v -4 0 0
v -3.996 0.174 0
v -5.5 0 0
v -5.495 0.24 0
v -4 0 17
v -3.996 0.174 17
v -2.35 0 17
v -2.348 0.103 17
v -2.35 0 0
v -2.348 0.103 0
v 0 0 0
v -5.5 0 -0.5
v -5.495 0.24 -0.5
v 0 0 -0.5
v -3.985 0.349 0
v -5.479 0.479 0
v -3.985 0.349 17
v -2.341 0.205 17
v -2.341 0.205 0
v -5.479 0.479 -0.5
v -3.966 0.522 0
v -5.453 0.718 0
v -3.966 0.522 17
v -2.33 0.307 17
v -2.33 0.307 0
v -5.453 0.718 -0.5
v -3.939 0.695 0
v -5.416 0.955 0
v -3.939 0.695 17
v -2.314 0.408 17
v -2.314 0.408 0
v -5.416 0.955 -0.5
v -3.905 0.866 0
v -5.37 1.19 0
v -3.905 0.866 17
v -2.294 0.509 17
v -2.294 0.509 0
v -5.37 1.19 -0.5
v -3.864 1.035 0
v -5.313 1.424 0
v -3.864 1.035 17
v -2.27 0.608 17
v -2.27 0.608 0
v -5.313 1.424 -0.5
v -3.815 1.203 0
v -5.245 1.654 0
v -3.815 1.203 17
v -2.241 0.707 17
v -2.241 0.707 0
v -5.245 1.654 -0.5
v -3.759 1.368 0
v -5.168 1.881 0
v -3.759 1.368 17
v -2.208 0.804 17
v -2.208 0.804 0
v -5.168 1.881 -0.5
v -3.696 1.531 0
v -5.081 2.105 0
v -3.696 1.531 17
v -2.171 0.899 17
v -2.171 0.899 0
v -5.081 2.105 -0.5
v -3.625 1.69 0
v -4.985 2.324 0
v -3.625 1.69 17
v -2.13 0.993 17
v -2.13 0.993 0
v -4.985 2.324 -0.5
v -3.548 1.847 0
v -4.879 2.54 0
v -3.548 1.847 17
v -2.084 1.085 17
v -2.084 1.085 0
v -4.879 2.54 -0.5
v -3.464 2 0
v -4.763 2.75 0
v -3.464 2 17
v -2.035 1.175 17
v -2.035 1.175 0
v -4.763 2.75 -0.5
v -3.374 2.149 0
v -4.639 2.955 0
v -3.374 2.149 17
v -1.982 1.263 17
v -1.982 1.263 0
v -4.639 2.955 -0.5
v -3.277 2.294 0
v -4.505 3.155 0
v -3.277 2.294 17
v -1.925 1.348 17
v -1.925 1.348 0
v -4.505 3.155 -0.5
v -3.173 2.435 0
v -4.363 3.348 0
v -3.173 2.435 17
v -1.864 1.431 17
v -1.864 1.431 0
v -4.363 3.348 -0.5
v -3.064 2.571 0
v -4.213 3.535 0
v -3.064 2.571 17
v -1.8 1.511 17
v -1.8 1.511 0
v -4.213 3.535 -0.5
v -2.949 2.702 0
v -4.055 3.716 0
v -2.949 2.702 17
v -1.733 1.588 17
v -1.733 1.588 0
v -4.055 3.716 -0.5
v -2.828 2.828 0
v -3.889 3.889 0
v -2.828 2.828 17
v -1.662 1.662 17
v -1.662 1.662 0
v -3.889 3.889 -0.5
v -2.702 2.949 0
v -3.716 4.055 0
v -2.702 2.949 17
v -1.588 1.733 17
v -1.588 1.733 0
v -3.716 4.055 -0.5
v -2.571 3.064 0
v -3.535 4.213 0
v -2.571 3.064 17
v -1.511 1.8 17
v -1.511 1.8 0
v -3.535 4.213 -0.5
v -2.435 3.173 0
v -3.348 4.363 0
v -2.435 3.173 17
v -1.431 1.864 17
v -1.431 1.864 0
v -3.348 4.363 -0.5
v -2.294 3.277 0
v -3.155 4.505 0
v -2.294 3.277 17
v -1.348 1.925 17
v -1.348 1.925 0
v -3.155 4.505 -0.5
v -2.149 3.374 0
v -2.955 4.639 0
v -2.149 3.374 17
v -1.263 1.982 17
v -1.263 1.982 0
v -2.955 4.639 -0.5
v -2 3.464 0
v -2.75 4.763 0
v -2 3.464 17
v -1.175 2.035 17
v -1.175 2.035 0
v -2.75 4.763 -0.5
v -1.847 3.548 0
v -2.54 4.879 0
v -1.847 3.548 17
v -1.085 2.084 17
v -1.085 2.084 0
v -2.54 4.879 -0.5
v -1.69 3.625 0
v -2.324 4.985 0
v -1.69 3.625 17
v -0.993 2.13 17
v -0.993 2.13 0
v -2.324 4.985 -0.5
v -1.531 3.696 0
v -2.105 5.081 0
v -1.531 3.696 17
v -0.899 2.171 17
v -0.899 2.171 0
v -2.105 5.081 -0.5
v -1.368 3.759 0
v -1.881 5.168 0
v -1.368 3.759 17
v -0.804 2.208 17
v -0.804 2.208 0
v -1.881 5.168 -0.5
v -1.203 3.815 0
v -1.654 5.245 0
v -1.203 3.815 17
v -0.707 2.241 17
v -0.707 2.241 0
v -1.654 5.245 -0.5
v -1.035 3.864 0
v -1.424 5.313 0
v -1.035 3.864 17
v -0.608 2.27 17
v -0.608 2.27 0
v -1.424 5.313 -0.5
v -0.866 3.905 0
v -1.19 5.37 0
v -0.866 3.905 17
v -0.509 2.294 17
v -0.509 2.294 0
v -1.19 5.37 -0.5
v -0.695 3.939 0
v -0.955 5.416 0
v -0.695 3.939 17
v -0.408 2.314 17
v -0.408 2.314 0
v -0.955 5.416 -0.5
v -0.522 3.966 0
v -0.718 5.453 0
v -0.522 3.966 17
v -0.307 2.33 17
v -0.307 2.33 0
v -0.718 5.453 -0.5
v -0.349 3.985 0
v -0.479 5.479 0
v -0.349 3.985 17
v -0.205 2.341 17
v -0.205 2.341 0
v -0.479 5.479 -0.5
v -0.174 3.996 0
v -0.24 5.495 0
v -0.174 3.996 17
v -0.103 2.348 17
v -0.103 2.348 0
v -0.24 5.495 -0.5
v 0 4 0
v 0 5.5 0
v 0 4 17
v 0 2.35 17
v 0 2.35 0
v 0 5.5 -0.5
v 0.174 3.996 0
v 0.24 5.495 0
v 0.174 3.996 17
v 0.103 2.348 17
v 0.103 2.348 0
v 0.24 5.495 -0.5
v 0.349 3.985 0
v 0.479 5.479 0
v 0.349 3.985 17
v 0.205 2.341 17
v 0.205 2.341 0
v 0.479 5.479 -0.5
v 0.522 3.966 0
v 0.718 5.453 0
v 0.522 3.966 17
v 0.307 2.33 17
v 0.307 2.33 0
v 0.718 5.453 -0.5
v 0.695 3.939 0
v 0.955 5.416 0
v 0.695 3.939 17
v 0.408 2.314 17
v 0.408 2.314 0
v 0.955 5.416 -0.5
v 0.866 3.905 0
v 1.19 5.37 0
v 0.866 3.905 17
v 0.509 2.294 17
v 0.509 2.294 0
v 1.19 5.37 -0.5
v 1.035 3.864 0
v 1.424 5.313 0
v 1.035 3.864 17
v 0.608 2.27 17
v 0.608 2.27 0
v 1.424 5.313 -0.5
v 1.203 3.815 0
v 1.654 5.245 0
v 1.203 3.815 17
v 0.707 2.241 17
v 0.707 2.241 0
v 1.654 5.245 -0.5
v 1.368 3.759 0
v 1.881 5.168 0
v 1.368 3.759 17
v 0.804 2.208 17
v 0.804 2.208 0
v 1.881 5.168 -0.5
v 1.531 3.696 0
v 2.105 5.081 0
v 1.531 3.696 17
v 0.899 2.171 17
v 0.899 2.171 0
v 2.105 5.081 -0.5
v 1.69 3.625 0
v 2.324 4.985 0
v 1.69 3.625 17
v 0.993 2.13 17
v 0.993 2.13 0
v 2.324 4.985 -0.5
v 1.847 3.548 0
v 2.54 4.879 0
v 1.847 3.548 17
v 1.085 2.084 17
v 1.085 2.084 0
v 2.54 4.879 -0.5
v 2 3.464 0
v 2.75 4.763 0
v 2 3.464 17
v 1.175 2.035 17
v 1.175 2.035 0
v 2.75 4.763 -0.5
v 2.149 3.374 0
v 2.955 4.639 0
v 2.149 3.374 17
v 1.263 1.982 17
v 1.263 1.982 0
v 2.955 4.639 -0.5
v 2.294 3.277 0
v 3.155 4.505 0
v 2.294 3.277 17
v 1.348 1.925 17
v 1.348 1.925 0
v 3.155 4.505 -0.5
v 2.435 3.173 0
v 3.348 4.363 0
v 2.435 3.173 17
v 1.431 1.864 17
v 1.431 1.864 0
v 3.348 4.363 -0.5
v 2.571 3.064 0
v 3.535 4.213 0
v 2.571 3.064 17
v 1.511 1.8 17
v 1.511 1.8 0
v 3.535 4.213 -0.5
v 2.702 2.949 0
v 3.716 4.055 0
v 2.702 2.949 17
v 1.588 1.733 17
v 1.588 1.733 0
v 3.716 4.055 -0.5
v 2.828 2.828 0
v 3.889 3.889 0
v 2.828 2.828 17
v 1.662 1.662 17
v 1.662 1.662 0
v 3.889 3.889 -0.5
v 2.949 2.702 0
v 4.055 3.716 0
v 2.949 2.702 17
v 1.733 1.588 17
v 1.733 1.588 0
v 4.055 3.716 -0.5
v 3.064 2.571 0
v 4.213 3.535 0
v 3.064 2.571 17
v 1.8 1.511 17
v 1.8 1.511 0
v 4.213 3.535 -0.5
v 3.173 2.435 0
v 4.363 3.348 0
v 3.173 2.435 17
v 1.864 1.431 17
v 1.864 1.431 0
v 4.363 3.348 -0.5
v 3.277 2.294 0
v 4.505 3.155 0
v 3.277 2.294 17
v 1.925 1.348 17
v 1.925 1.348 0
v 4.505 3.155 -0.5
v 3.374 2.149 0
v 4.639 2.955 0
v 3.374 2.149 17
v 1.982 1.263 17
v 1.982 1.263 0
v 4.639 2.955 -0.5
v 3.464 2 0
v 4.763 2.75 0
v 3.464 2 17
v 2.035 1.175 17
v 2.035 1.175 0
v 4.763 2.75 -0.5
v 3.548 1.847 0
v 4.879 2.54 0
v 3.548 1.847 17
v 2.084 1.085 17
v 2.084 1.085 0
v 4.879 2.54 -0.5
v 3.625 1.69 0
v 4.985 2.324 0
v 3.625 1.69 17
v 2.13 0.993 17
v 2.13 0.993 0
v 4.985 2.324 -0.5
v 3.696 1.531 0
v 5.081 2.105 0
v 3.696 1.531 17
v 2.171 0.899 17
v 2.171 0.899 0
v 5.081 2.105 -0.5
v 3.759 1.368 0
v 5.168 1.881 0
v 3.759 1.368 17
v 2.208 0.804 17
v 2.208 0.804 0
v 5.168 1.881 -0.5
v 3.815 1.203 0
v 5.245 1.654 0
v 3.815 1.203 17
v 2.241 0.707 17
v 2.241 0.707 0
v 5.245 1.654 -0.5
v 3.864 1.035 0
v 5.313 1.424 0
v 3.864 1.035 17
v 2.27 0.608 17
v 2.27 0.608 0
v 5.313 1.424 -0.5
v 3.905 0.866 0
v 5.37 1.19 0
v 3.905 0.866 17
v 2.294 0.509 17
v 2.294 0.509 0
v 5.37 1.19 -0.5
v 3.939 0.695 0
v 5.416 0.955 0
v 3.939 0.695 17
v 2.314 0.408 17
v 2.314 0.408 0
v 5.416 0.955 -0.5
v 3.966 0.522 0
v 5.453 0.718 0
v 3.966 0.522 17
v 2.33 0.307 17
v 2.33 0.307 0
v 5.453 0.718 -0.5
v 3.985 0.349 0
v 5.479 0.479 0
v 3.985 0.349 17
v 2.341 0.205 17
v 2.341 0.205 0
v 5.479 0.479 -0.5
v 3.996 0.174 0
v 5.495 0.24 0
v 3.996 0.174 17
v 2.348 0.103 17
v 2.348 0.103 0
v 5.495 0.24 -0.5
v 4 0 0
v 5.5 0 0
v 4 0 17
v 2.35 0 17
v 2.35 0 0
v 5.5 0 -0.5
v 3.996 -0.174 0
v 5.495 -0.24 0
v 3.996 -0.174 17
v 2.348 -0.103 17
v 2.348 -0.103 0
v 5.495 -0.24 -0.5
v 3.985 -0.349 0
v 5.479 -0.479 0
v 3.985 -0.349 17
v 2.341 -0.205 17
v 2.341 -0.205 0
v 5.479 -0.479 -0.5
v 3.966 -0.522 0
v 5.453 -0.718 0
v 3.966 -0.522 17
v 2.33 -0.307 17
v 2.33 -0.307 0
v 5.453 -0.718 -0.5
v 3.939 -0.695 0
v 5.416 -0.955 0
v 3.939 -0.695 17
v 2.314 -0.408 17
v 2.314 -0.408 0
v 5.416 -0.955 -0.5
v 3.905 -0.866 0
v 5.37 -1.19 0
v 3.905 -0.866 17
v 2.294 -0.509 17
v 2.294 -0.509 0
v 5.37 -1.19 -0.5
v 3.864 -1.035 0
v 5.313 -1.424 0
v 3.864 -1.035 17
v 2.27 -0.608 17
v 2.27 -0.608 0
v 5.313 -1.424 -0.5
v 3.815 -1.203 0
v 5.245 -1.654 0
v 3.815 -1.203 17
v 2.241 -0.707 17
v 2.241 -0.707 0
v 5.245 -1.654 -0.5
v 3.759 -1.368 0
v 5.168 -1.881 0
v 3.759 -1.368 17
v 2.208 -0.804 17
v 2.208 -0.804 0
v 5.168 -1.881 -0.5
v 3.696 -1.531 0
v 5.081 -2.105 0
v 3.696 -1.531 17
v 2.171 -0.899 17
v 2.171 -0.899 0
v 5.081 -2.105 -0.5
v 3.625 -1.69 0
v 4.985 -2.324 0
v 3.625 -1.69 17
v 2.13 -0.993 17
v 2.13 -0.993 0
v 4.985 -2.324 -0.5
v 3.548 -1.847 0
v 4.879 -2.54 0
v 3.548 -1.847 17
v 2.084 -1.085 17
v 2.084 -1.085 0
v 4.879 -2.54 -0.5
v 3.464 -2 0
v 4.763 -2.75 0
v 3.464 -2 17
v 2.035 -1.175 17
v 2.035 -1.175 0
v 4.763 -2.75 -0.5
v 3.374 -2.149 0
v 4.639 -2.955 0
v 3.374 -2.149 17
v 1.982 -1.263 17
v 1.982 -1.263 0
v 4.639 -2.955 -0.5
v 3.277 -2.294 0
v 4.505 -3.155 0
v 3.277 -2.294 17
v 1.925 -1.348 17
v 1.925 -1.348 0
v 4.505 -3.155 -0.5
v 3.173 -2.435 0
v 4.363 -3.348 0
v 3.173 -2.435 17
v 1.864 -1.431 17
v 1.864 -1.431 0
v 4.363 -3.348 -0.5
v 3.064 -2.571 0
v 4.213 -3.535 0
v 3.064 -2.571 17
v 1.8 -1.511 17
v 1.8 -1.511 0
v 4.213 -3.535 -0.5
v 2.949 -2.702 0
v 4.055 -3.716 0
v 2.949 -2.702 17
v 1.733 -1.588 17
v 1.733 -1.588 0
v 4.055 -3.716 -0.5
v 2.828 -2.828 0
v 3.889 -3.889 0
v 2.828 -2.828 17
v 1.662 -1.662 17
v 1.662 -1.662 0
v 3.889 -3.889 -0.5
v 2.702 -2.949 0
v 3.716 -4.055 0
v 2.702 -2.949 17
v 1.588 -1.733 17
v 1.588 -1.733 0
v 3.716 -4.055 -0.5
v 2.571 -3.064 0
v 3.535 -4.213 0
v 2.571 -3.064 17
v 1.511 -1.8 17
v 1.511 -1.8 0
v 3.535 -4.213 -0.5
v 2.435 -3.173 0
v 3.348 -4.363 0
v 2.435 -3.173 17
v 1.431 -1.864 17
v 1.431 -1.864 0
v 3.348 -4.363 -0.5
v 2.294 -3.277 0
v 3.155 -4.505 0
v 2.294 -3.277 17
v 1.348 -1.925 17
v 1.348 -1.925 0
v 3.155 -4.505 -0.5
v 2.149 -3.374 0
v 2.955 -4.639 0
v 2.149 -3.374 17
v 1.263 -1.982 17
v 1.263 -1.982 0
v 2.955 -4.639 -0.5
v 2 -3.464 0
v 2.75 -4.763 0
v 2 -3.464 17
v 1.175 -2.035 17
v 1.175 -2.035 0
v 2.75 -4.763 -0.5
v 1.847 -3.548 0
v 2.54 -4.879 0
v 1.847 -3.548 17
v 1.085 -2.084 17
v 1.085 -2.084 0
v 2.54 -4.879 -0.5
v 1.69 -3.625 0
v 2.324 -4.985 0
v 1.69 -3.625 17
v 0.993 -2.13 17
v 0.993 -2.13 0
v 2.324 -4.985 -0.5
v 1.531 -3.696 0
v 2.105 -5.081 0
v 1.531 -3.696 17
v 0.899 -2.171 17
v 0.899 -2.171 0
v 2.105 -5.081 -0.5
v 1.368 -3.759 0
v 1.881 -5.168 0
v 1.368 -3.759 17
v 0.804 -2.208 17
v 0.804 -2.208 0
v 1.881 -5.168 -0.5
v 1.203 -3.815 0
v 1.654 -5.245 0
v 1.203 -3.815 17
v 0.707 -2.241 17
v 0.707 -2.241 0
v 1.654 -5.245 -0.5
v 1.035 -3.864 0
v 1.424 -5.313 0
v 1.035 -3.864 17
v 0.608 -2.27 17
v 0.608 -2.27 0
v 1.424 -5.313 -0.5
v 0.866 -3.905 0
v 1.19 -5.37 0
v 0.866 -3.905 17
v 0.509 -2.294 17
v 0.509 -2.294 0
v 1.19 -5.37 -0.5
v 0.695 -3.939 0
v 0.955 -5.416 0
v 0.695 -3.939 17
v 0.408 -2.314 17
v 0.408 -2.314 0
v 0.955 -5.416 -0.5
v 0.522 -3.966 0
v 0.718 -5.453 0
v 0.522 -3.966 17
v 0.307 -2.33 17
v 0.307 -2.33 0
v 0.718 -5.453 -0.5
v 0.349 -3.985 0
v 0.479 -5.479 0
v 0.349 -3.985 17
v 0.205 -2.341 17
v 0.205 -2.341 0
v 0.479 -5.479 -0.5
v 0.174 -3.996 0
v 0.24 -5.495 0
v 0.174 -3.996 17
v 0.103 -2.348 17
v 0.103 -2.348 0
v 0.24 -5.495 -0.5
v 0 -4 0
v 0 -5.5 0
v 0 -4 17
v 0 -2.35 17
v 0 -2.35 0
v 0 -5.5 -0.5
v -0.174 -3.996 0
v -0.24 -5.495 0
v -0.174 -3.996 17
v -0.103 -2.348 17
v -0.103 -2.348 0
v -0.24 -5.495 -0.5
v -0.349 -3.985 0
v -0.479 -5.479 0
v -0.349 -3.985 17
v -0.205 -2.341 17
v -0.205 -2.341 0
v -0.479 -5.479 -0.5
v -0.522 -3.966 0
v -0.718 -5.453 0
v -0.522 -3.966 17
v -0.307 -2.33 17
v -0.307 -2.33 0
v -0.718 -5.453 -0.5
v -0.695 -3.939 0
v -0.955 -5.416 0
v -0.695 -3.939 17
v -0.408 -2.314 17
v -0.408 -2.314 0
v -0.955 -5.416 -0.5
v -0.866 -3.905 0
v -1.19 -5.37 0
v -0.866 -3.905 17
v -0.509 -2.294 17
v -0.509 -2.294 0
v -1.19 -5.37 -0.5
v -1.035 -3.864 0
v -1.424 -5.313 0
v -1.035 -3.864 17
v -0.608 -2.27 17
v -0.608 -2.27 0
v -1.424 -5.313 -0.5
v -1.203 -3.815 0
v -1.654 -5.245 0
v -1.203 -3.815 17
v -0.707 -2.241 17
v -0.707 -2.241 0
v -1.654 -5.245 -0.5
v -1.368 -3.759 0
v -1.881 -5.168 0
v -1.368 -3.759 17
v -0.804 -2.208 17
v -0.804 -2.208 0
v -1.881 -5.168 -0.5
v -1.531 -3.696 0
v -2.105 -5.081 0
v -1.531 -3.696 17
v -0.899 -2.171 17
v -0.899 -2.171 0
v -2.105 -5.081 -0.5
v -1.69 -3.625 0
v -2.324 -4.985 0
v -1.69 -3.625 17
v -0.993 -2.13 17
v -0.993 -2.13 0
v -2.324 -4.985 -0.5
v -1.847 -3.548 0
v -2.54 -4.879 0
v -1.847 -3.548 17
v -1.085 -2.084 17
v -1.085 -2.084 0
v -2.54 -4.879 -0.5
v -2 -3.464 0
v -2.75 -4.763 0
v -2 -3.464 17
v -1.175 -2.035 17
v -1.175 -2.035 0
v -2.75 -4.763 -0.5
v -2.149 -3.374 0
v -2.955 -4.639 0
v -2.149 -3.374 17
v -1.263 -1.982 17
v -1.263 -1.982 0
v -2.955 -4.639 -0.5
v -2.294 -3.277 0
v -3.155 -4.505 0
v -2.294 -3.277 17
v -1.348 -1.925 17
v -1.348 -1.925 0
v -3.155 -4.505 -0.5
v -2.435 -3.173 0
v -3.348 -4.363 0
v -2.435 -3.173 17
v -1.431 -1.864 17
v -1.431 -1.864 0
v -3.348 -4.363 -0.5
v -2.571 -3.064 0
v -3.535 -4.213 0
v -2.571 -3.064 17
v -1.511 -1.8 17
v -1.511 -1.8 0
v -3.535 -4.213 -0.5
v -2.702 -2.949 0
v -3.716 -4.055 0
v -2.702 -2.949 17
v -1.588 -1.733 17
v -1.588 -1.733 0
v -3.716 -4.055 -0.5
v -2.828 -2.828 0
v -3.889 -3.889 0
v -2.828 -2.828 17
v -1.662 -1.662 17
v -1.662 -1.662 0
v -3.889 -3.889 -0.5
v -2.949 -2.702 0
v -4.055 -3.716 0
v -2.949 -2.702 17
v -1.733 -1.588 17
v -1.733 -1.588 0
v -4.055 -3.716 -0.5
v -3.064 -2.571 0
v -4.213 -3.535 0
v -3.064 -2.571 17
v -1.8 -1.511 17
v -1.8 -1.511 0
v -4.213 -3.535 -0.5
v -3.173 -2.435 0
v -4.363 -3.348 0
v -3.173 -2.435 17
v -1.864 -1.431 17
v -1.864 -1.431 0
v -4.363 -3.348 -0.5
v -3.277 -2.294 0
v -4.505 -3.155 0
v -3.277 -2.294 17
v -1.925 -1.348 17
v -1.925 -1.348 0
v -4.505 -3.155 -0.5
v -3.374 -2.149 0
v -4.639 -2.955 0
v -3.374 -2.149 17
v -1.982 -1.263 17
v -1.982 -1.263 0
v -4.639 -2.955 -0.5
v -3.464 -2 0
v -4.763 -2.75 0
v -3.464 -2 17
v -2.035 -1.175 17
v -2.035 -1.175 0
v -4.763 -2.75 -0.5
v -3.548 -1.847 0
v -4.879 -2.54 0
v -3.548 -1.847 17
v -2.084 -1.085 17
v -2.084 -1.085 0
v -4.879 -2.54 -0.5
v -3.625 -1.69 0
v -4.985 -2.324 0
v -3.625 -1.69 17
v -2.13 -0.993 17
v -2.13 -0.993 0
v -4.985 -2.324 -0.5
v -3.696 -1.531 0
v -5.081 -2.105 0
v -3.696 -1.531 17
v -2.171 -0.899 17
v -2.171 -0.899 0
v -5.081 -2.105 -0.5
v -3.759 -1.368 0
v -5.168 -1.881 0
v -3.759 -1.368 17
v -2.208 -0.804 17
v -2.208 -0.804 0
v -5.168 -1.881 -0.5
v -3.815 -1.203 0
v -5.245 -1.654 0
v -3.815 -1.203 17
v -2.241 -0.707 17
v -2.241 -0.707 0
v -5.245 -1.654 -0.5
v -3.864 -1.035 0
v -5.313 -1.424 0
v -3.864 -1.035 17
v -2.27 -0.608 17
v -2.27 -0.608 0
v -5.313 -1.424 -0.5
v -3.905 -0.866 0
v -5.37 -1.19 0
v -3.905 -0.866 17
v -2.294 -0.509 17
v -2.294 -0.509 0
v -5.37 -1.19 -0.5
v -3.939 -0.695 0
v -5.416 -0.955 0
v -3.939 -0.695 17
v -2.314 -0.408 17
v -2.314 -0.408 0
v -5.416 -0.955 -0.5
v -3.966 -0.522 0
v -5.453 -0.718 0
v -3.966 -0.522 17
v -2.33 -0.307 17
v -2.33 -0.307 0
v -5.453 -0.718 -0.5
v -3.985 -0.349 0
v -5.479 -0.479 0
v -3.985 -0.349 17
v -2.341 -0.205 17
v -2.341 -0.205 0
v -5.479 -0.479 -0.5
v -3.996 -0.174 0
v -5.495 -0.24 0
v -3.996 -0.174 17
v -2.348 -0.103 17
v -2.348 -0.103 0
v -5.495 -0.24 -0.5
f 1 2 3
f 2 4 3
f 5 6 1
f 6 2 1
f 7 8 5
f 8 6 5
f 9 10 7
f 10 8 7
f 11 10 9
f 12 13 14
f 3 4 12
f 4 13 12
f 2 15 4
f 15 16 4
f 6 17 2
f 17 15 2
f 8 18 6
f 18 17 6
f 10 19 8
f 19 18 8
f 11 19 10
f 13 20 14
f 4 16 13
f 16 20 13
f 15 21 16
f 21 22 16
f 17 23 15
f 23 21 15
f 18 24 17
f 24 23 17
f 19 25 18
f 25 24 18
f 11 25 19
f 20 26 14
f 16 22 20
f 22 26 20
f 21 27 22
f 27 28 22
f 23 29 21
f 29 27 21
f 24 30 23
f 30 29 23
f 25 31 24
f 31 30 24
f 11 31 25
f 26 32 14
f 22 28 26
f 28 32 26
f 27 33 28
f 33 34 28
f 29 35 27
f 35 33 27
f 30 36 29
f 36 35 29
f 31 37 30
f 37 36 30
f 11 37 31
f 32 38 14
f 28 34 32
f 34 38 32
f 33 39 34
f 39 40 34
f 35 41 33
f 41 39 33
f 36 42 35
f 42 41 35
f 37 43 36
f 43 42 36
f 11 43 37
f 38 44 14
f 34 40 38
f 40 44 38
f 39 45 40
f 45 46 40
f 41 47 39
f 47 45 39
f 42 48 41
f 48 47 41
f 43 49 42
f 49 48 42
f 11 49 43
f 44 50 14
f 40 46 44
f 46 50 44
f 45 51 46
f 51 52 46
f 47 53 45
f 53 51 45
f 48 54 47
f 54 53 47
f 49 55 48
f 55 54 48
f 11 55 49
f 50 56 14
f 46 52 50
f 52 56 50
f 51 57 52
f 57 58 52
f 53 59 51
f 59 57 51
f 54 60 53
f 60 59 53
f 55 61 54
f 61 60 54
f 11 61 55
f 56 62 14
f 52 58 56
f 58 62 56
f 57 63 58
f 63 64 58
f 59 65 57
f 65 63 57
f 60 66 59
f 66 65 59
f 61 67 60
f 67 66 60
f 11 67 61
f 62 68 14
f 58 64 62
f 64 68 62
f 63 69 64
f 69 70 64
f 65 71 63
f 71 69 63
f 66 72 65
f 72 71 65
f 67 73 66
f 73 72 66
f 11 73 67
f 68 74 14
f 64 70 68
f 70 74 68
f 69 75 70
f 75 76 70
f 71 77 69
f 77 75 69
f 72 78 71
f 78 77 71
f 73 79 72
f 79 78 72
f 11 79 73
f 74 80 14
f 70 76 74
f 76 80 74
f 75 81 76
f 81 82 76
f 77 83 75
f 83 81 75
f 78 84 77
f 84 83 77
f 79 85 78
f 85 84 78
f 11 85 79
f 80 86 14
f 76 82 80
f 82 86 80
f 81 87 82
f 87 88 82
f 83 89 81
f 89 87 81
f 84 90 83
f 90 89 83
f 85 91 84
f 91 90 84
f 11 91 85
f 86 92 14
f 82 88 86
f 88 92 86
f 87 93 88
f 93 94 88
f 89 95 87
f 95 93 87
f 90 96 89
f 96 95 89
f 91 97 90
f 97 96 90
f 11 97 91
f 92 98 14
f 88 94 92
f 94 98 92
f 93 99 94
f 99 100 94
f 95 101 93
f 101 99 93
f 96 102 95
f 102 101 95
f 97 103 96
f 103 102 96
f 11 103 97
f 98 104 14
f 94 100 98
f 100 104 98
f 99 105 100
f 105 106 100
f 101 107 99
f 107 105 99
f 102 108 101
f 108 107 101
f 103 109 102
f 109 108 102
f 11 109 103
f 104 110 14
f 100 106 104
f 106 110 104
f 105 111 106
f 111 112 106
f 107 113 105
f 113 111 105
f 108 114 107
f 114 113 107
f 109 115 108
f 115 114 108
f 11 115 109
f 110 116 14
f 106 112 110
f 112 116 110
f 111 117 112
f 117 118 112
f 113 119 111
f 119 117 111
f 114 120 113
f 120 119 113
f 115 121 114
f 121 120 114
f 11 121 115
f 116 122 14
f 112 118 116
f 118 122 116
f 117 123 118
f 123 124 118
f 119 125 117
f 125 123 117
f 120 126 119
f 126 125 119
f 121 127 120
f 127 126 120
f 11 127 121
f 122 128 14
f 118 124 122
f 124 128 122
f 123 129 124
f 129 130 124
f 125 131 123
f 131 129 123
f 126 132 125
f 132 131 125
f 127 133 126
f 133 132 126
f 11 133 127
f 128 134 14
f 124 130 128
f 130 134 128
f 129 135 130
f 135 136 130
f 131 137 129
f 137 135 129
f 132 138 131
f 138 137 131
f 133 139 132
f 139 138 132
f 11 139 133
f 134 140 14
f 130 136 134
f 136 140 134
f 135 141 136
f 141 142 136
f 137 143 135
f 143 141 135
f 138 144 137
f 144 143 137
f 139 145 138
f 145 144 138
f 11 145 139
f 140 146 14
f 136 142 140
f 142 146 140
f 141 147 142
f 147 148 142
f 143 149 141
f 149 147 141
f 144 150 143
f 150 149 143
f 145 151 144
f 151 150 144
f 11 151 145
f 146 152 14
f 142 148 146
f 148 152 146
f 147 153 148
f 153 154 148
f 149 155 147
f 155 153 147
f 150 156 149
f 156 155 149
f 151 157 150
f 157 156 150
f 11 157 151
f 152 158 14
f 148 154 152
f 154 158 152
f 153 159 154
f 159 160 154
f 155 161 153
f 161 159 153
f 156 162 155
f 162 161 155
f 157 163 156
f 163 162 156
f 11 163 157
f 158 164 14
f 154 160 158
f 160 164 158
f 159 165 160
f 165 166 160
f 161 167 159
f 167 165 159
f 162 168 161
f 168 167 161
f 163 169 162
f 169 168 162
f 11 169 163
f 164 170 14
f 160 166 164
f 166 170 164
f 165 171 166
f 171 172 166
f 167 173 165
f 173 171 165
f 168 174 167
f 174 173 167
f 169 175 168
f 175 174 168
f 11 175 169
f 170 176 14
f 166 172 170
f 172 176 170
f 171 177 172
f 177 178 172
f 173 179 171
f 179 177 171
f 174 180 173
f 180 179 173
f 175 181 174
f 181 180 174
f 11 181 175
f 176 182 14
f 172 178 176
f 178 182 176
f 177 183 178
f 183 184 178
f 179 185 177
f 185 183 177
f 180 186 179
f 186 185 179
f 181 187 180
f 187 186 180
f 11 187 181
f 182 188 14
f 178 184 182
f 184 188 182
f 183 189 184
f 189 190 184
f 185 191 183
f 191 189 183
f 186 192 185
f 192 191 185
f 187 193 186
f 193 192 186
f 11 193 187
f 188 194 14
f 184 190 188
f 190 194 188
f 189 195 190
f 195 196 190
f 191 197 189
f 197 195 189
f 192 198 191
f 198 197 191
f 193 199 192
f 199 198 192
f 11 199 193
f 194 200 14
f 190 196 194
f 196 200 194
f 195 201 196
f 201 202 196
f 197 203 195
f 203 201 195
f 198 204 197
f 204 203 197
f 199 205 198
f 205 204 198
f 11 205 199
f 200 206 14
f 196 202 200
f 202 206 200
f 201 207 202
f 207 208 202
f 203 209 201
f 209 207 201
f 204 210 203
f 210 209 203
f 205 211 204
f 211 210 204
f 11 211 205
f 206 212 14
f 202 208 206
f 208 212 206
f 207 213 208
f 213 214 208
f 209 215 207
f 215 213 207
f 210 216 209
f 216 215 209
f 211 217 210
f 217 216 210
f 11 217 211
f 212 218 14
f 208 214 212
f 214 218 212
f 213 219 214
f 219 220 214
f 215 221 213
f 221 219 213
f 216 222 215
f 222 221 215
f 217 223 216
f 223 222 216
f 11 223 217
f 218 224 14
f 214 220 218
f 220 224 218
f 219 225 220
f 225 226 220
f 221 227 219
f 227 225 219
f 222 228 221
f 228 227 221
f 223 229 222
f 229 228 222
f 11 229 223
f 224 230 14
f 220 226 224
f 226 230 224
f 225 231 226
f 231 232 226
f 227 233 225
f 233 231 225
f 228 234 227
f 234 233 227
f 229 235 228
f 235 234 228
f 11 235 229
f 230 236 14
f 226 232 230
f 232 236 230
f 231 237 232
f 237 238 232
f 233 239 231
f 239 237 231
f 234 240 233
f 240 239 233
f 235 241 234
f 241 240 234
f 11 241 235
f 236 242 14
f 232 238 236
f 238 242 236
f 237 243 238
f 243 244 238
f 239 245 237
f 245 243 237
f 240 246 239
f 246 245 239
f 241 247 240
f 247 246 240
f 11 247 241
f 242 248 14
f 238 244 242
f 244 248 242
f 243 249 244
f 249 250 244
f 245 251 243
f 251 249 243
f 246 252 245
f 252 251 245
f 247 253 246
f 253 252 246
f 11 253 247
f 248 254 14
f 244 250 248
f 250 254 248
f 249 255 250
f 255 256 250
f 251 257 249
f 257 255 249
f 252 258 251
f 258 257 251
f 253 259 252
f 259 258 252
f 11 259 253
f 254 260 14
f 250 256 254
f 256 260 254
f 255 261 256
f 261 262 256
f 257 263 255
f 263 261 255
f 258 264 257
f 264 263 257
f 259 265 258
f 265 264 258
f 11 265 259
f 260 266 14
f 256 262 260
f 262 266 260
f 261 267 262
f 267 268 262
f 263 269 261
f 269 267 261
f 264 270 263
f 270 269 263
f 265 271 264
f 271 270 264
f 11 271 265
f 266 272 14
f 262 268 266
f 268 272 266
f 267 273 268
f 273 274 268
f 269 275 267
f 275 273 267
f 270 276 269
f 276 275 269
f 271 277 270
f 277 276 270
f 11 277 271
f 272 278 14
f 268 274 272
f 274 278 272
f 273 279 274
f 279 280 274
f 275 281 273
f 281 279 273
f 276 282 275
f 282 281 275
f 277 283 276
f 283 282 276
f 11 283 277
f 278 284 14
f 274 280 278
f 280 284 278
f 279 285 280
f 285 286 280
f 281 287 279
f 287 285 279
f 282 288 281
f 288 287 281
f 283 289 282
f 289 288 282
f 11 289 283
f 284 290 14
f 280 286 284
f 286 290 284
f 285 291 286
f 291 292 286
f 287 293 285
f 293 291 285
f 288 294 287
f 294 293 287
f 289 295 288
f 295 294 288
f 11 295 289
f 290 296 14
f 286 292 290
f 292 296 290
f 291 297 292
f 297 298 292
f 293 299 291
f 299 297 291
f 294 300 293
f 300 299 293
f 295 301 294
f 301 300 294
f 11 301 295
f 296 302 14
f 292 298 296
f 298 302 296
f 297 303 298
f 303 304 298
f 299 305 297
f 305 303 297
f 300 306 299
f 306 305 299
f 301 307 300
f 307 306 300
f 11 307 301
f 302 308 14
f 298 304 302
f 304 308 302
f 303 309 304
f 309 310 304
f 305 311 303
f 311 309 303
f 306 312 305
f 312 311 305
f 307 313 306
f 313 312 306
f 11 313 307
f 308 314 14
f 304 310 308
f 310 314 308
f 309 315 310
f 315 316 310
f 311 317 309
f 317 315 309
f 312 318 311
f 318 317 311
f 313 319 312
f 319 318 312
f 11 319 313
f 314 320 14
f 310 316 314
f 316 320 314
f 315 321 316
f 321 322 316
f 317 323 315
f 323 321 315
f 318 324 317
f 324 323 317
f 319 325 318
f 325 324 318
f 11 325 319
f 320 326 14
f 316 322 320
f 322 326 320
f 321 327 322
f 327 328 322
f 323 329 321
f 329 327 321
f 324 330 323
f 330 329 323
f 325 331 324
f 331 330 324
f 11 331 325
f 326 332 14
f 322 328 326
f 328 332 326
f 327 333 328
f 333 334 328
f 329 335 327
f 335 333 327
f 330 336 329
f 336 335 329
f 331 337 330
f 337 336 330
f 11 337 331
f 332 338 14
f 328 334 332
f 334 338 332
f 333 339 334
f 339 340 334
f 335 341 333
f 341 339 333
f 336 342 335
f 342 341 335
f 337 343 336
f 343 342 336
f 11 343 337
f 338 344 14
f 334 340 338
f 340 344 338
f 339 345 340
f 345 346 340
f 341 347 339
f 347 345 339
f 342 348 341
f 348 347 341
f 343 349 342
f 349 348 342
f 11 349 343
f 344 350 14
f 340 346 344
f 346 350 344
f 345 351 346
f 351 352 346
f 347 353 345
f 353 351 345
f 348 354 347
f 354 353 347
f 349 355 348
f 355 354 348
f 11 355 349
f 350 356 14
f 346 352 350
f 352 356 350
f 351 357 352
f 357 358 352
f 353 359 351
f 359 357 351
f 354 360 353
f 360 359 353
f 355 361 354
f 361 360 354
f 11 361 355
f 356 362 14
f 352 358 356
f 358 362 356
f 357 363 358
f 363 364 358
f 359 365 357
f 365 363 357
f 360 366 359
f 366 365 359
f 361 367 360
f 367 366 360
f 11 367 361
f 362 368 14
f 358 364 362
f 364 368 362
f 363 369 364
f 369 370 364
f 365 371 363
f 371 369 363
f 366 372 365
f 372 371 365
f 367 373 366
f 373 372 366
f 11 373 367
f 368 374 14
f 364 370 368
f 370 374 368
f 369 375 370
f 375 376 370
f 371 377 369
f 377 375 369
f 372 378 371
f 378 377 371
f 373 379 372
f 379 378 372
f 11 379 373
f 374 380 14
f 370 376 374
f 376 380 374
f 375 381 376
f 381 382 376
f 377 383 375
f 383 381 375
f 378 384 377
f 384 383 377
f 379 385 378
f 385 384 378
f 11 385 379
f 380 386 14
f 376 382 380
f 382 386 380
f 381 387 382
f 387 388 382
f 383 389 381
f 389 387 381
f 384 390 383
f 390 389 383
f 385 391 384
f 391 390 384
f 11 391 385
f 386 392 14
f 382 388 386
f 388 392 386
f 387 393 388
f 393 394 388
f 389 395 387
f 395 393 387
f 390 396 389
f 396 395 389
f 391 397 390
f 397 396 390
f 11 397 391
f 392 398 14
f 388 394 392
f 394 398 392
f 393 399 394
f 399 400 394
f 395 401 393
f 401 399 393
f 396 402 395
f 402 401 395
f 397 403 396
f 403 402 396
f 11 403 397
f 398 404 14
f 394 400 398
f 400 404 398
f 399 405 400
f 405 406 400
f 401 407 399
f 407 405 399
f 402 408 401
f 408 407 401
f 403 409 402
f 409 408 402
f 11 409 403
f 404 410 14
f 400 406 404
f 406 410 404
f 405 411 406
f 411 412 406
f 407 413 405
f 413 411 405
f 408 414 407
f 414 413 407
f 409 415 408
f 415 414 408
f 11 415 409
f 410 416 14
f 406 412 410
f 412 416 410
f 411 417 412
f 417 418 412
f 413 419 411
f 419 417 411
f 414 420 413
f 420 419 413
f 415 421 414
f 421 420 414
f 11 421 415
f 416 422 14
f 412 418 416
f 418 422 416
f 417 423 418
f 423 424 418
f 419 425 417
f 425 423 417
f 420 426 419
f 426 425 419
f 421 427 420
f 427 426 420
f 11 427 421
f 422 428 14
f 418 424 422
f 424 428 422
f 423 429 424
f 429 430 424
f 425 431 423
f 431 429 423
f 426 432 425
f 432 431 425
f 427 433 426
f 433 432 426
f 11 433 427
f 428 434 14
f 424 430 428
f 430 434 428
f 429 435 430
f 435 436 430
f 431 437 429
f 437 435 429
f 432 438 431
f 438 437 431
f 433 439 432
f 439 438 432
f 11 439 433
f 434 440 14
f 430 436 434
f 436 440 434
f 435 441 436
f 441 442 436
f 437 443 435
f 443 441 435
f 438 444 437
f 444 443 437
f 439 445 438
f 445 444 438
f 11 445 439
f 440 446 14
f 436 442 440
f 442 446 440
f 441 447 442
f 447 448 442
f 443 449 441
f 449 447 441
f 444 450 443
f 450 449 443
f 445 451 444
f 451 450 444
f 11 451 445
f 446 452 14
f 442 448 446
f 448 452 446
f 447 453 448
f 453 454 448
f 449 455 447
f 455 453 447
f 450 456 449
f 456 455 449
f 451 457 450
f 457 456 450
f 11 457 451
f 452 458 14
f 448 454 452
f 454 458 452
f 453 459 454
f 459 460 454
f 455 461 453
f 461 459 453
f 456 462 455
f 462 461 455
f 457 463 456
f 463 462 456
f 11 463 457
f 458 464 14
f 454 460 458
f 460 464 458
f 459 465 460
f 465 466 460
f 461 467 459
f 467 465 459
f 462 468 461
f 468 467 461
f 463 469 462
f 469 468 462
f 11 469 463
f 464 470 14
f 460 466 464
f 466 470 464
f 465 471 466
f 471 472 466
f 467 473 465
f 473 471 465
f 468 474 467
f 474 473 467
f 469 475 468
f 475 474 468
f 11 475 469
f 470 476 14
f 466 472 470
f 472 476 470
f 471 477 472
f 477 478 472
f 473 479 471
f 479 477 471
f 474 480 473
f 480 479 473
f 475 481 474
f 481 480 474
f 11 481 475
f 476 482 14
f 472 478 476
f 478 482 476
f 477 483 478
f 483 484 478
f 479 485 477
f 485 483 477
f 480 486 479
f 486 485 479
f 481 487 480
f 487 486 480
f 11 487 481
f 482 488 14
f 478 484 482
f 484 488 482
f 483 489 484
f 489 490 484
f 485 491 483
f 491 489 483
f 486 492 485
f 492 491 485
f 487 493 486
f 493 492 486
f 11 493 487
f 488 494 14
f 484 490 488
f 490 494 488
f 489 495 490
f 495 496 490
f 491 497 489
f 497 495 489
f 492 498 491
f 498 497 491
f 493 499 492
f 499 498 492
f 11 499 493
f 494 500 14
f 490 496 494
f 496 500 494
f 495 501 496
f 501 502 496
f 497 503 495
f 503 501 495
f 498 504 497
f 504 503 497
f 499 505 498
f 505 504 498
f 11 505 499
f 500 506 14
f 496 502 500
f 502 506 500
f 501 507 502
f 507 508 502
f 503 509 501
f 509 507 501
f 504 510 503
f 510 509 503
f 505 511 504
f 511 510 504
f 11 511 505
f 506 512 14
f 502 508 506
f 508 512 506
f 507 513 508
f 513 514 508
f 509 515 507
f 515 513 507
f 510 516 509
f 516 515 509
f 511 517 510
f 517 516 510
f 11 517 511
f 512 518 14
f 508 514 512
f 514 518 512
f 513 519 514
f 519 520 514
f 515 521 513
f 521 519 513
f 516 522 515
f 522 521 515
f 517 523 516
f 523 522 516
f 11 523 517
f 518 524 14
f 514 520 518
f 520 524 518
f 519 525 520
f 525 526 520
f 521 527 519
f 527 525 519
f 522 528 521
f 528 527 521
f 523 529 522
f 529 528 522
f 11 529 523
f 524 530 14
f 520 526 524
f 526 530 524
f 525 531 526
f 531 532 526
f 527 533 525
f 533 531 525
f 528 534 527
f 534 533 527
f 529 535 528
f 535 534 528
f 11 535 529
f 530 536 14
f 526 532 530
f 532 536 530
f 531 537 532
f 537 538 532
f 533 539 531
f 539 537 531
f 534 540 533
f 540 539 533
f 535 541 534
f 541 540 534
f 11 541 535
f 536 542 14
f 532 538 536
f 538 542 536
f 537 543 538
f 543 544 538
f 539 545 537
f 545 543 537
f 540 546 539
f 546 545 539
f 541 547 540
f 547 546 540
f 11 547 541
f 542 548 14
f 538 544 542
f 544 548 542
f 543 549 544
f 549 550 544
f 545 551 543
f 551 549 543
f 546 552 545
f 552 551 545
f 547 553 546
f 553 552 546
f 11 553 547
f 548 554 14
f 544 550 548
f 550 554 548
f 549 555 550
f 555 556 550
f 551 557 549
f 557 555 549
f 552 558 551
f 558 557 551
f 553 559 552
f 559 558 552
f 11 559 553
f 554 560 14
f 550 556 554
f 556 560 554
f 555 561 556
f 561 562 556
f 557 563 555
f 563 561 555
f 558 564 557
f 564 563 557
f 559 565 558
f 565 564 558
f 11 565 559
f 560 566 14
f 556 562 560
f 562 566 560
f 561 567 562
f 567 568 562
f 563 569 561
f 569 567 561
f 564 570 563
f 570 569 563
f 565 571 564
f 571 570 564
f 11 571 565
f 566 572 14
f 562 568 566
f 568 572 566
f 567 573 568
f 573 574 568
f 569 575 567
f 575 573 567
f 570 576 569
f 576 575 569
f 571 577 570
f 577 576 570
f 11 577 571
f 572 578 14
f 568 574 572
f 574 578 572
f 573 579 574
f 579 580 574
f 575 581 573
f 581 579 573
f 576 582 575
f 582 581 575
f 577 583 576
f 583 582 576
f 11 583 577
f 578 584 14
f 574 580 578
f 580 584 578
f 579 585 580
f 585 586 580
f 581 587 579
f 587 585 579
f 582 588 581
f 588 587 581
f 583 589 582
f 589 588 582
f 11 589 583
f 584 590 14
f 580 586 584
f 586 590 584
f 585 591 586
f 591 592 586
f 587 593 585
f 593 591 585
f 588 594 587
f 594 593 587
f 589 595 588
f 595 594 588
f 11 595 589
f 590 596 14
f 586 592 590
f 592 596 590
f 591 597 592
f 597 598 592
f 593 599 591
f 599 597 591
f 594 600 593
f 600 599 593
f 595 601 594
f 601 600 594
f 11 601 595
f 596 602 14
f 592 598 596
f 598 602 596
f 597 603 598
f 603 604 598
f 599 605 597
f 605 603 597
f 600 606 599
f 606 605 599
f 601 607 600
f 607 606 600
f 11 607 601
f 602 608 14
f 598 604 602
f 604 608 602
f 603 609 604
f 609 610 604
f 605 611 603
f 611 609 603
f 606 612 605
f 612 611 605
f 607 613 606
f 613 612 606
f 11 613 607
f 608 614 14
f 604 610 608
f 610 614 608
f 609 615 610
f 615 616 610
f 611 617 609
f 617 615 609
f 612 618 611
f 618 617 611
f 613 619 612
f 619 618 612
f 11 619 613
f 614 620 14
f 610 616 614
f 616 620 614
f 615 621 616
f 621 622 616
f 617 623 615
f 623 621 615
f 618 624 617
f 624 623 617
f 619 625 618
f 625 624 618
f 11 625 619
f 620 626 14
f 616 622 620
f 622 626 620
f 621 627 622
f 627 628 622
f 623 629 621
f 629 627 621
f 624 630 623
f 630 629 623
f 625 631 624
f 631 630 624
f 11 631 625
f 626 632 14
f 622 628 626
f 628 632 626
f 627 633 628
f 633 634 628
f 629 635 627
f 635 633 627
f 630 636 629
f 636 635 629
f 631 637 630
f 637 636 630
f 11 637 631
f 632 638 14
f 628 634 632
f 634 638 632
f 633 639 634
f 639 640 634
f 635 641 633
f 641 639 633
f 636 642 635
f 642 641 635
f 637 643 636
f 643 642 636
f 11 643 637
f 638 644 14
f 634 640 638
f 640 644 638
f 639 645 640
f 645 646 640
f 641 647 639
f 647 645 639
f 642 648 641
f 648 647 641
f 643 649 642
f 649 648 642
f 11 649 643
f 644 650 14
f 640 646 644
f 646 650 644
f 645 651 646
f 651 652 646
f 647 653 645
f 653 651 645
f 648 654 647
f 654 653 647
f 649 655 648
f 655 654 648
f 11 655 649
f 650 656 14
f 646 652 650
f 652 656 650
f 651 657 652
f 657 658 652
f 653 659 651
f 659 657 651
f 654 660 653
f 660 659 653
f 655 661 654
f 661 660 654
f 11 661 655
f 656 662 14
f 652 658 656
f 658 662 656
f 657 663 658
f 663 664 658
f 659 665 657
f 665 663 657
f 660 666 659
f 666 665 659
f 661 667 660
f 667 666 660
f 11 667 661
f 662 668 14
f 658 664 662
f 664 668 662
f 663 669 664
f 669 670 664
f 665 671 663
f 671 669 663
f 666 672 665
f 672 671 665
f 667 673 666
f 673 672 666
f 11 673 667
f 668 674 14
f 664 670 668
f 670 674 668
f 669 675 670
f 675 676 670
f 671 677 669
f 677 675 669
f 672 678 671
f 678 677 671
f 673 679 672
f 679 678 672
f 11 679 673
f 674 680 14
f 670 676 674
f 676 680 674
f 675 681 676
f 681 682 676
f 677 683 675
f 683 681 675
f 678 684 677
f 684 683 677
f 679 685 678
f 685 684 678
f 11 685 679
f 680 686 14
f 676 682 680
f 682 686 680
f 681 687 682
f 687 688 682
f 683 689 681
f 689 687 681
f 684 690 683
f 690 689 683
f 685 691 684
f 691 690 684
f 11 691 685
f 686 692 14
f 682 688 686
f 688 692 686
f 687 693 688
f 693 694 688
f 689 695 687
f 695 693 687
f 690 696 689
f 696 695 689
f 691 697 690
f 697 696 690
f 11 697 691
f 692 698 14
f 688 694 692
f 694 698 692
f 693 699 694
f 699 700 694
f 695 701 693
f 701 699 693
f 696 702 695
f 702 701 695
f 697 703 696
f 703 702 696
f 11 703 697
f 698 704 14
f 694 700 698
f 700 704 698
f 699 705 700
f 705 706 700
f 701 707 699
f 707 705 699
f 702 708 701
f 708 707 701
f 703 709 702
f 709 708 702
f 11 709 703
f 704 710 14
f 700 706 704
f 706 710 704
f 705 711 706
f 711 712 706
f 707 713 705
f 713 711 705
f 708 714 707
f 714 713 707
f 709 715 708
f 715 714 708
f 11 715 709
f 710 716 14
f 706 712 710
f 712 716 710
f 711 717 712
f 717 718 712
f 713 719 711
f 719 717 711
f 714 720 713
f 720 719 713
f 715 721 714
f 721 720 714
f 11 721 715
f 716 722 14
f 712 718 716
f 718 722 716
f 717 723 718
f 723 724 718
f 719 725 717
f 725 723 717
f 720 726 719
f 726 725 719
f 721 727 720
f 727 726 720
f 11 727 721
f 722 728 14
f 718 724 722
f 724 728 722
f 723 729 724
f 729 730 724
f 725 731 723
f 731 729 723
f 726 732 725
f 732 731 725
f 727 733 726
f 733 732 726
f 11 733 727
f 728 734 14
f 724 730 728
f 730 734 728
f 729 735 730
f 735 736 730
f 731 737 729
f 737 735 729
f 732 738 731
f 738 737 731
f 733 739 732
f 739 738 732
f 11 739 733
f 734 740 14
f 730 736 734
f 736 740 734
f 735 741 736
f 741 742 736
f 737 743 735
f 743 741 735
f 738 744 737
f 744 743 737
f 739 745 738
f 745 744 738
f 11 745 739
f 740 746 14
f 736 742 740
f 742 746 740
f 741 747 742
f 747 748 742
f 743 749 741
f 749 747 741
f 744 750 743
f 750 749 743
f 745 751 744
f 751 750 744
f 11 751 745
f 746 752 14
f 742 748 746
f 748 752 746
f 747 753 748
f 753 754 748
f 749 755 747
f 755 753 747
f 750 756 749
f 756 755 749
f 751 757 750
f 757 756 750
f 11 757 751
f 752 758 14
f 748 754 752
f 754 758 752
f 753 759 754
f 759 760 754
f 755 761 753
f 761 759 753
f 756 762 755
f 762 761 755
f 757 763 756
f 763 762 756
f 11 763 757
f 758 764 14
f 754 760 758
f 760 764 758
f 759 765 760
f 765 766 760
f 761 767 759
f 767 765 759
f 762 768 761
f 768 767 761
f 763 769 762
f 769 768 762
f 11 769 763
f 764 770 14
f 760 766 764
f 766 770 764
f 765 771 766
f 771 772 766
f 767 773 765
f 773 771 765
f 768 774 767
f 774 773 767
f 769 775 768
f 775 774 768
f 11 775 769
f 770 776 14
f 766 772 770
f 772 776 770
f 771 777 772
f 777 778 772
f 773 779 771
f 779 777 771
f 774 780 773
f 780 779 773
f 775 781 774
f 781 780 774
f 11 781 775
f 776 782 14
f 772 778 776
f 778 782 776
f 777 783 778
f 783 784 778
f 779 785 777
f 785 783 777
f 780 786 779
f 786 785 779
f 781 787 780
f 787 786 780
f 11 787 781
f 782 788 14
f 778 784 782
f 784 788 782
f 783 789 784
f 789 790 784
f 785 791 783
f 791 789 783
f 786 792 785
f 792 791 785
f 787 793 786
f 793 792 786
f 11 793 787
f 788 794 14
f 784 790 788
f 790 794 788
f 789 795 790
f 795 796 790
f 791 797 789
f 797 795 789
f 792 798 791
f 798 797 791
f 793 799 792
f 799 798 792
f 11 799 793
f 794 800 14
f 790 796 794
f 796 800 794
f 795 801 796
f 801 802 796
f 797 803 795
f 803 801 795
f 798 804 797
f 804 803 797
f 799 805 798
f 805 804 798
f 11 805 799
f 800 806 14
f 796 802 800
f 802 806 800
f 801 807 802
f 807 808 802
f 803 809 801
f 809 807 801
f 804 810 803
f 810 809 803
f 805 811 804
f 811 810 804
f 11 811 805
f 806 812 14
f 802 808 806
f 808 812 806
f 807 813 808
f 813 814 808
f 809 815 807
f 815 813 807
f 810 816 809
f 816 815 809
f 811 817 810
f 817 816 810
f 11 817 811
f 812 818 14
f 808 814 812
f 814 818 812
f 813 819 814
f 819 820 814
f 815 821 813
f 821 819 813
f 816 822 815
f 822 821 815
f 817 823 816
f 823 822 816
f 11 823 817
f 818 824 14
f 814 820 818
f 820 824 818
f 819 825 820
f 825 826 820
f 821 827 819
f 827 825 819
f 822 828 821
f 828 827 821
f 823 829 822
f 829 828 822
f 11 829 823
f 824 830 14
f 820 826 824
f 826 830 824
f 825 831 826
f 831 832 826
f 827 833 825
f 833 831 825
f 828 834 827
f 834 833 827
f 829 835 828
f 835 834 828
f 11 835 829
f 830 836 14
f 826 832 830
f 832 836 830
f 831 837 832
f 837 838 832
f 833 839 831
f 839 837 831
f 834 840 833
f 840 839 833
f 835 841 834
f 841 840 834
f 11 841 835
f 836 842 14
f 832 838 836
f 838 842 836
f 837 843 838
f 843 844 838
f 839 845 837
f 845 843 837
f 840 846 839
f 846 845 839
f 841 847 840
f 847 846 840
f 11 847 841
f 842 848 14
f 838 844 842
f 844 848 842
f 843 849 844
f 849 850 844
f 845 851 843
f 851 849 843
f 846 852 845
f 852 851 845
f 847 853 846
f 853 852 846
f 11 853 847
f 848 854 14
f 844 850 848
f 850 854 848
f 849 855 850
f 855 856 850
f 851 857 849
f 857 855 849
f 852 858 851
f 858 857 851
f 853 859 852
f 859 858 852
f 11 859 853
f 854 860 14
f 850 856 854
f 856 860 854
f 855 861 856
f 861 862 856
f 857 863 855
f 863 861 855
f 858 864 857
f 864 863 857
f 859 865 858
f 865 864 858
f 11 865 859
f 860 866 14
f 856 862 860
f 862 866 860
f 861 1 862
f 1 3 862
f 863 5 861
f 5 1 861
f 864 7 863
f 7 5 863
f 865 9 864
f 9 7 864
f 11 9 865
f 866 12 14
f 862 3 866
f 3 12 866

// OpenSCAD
// file: belt_director.scad
// The Belt Director: a shouldered sleeve, shared by the two lengths of it.
//
//     210-004_SmallBeltDirector.scad   S1 17.000 long
//     210-005_LargeBeltDirector.scad   S1 27.000 long
//
// Two MR128s press onto S1, whose Ø8.000 is their bore, so their Ø12 outer races carry the belt; the
// directors push through the Arm Body's lug columns front to back and a cap presses in behind
// (specs/008.5 step 7). Measured from both references with scadmesh profile/slice/radial; they agree
// to 0.002, and their only difference is S1's length. The feature IDs are those of each part's
// .view.json:
//
//     ID  feature   value                       z span
//     H1  head      Ø11.000, solid              -0.500 .. 0
//     S1  shank     Ø8.000                      0 .. length
//     B1  core      Ø4.700, blind to H1         0 .. length
//
// The z rows a histogram reports along S1 (5.667, 11.333 on the Small; 5.4, 6.75, ... on the Large)
// are tessellation rows, not faces. FRAME: the axis on +Z through the origin, H1's top at z = 0.
//
// FITS, deferred: S1 on the MR128's bore is settled with the arm body's assembly (armbody_assembly).
//
// Used, not included: each part file calls belt_director(length).

BELT_DIRECTOR_HEAD  = [5.500, 0.500];   // radius, thickness
BELT_DIRECTOR_SHANK = 4.000;            // radius
BELT_DIRECTOR_CORE  = 2.350;            // radius

module belt_director(length)
    rotate_extrude() polygon([
        [0, -BELT_DIRECTOR_HEAD[1]], [BELT_DIRECTOR_HEAD[0], -BELT_DIRECTOR_HEAD[1]],
        [BELT_DIRECTOR_HEAD[0], 0], [BELT_DIRECTOR_SHANK, 0], [BELT_DIRECTOR_SHANK, length],
        [BELT_DIRECTOR_CORE, length], [BELT_DIRECTOR_CORE, 0], [0, 0]]);
// main file
// #210-004 Small Belt Director — parametric source.
// The Small Belt Director: belt_director.scad's shouldered sleeve, with S1 17.000 long. That file owns
// the measurements, the feature IDs and the deferred fits.
//
//   config = "previous" — a faithful recreation of the reference mesh
//                         (../Reference/meshes/200-ArmBody/), in that mesh's frame.
//   config = "revised"  — the same part. Its fits wait for the arm body's assembly.

use <belt_director.scad>

/* [Configuration] */
// Parameter set: previous (reference) or revised
config = "previous"; // [previous, revised]

/* [Hidden] */
$fn = 144;

LENGTH = 17.000;   // S1

belt_director(LENGTH);
